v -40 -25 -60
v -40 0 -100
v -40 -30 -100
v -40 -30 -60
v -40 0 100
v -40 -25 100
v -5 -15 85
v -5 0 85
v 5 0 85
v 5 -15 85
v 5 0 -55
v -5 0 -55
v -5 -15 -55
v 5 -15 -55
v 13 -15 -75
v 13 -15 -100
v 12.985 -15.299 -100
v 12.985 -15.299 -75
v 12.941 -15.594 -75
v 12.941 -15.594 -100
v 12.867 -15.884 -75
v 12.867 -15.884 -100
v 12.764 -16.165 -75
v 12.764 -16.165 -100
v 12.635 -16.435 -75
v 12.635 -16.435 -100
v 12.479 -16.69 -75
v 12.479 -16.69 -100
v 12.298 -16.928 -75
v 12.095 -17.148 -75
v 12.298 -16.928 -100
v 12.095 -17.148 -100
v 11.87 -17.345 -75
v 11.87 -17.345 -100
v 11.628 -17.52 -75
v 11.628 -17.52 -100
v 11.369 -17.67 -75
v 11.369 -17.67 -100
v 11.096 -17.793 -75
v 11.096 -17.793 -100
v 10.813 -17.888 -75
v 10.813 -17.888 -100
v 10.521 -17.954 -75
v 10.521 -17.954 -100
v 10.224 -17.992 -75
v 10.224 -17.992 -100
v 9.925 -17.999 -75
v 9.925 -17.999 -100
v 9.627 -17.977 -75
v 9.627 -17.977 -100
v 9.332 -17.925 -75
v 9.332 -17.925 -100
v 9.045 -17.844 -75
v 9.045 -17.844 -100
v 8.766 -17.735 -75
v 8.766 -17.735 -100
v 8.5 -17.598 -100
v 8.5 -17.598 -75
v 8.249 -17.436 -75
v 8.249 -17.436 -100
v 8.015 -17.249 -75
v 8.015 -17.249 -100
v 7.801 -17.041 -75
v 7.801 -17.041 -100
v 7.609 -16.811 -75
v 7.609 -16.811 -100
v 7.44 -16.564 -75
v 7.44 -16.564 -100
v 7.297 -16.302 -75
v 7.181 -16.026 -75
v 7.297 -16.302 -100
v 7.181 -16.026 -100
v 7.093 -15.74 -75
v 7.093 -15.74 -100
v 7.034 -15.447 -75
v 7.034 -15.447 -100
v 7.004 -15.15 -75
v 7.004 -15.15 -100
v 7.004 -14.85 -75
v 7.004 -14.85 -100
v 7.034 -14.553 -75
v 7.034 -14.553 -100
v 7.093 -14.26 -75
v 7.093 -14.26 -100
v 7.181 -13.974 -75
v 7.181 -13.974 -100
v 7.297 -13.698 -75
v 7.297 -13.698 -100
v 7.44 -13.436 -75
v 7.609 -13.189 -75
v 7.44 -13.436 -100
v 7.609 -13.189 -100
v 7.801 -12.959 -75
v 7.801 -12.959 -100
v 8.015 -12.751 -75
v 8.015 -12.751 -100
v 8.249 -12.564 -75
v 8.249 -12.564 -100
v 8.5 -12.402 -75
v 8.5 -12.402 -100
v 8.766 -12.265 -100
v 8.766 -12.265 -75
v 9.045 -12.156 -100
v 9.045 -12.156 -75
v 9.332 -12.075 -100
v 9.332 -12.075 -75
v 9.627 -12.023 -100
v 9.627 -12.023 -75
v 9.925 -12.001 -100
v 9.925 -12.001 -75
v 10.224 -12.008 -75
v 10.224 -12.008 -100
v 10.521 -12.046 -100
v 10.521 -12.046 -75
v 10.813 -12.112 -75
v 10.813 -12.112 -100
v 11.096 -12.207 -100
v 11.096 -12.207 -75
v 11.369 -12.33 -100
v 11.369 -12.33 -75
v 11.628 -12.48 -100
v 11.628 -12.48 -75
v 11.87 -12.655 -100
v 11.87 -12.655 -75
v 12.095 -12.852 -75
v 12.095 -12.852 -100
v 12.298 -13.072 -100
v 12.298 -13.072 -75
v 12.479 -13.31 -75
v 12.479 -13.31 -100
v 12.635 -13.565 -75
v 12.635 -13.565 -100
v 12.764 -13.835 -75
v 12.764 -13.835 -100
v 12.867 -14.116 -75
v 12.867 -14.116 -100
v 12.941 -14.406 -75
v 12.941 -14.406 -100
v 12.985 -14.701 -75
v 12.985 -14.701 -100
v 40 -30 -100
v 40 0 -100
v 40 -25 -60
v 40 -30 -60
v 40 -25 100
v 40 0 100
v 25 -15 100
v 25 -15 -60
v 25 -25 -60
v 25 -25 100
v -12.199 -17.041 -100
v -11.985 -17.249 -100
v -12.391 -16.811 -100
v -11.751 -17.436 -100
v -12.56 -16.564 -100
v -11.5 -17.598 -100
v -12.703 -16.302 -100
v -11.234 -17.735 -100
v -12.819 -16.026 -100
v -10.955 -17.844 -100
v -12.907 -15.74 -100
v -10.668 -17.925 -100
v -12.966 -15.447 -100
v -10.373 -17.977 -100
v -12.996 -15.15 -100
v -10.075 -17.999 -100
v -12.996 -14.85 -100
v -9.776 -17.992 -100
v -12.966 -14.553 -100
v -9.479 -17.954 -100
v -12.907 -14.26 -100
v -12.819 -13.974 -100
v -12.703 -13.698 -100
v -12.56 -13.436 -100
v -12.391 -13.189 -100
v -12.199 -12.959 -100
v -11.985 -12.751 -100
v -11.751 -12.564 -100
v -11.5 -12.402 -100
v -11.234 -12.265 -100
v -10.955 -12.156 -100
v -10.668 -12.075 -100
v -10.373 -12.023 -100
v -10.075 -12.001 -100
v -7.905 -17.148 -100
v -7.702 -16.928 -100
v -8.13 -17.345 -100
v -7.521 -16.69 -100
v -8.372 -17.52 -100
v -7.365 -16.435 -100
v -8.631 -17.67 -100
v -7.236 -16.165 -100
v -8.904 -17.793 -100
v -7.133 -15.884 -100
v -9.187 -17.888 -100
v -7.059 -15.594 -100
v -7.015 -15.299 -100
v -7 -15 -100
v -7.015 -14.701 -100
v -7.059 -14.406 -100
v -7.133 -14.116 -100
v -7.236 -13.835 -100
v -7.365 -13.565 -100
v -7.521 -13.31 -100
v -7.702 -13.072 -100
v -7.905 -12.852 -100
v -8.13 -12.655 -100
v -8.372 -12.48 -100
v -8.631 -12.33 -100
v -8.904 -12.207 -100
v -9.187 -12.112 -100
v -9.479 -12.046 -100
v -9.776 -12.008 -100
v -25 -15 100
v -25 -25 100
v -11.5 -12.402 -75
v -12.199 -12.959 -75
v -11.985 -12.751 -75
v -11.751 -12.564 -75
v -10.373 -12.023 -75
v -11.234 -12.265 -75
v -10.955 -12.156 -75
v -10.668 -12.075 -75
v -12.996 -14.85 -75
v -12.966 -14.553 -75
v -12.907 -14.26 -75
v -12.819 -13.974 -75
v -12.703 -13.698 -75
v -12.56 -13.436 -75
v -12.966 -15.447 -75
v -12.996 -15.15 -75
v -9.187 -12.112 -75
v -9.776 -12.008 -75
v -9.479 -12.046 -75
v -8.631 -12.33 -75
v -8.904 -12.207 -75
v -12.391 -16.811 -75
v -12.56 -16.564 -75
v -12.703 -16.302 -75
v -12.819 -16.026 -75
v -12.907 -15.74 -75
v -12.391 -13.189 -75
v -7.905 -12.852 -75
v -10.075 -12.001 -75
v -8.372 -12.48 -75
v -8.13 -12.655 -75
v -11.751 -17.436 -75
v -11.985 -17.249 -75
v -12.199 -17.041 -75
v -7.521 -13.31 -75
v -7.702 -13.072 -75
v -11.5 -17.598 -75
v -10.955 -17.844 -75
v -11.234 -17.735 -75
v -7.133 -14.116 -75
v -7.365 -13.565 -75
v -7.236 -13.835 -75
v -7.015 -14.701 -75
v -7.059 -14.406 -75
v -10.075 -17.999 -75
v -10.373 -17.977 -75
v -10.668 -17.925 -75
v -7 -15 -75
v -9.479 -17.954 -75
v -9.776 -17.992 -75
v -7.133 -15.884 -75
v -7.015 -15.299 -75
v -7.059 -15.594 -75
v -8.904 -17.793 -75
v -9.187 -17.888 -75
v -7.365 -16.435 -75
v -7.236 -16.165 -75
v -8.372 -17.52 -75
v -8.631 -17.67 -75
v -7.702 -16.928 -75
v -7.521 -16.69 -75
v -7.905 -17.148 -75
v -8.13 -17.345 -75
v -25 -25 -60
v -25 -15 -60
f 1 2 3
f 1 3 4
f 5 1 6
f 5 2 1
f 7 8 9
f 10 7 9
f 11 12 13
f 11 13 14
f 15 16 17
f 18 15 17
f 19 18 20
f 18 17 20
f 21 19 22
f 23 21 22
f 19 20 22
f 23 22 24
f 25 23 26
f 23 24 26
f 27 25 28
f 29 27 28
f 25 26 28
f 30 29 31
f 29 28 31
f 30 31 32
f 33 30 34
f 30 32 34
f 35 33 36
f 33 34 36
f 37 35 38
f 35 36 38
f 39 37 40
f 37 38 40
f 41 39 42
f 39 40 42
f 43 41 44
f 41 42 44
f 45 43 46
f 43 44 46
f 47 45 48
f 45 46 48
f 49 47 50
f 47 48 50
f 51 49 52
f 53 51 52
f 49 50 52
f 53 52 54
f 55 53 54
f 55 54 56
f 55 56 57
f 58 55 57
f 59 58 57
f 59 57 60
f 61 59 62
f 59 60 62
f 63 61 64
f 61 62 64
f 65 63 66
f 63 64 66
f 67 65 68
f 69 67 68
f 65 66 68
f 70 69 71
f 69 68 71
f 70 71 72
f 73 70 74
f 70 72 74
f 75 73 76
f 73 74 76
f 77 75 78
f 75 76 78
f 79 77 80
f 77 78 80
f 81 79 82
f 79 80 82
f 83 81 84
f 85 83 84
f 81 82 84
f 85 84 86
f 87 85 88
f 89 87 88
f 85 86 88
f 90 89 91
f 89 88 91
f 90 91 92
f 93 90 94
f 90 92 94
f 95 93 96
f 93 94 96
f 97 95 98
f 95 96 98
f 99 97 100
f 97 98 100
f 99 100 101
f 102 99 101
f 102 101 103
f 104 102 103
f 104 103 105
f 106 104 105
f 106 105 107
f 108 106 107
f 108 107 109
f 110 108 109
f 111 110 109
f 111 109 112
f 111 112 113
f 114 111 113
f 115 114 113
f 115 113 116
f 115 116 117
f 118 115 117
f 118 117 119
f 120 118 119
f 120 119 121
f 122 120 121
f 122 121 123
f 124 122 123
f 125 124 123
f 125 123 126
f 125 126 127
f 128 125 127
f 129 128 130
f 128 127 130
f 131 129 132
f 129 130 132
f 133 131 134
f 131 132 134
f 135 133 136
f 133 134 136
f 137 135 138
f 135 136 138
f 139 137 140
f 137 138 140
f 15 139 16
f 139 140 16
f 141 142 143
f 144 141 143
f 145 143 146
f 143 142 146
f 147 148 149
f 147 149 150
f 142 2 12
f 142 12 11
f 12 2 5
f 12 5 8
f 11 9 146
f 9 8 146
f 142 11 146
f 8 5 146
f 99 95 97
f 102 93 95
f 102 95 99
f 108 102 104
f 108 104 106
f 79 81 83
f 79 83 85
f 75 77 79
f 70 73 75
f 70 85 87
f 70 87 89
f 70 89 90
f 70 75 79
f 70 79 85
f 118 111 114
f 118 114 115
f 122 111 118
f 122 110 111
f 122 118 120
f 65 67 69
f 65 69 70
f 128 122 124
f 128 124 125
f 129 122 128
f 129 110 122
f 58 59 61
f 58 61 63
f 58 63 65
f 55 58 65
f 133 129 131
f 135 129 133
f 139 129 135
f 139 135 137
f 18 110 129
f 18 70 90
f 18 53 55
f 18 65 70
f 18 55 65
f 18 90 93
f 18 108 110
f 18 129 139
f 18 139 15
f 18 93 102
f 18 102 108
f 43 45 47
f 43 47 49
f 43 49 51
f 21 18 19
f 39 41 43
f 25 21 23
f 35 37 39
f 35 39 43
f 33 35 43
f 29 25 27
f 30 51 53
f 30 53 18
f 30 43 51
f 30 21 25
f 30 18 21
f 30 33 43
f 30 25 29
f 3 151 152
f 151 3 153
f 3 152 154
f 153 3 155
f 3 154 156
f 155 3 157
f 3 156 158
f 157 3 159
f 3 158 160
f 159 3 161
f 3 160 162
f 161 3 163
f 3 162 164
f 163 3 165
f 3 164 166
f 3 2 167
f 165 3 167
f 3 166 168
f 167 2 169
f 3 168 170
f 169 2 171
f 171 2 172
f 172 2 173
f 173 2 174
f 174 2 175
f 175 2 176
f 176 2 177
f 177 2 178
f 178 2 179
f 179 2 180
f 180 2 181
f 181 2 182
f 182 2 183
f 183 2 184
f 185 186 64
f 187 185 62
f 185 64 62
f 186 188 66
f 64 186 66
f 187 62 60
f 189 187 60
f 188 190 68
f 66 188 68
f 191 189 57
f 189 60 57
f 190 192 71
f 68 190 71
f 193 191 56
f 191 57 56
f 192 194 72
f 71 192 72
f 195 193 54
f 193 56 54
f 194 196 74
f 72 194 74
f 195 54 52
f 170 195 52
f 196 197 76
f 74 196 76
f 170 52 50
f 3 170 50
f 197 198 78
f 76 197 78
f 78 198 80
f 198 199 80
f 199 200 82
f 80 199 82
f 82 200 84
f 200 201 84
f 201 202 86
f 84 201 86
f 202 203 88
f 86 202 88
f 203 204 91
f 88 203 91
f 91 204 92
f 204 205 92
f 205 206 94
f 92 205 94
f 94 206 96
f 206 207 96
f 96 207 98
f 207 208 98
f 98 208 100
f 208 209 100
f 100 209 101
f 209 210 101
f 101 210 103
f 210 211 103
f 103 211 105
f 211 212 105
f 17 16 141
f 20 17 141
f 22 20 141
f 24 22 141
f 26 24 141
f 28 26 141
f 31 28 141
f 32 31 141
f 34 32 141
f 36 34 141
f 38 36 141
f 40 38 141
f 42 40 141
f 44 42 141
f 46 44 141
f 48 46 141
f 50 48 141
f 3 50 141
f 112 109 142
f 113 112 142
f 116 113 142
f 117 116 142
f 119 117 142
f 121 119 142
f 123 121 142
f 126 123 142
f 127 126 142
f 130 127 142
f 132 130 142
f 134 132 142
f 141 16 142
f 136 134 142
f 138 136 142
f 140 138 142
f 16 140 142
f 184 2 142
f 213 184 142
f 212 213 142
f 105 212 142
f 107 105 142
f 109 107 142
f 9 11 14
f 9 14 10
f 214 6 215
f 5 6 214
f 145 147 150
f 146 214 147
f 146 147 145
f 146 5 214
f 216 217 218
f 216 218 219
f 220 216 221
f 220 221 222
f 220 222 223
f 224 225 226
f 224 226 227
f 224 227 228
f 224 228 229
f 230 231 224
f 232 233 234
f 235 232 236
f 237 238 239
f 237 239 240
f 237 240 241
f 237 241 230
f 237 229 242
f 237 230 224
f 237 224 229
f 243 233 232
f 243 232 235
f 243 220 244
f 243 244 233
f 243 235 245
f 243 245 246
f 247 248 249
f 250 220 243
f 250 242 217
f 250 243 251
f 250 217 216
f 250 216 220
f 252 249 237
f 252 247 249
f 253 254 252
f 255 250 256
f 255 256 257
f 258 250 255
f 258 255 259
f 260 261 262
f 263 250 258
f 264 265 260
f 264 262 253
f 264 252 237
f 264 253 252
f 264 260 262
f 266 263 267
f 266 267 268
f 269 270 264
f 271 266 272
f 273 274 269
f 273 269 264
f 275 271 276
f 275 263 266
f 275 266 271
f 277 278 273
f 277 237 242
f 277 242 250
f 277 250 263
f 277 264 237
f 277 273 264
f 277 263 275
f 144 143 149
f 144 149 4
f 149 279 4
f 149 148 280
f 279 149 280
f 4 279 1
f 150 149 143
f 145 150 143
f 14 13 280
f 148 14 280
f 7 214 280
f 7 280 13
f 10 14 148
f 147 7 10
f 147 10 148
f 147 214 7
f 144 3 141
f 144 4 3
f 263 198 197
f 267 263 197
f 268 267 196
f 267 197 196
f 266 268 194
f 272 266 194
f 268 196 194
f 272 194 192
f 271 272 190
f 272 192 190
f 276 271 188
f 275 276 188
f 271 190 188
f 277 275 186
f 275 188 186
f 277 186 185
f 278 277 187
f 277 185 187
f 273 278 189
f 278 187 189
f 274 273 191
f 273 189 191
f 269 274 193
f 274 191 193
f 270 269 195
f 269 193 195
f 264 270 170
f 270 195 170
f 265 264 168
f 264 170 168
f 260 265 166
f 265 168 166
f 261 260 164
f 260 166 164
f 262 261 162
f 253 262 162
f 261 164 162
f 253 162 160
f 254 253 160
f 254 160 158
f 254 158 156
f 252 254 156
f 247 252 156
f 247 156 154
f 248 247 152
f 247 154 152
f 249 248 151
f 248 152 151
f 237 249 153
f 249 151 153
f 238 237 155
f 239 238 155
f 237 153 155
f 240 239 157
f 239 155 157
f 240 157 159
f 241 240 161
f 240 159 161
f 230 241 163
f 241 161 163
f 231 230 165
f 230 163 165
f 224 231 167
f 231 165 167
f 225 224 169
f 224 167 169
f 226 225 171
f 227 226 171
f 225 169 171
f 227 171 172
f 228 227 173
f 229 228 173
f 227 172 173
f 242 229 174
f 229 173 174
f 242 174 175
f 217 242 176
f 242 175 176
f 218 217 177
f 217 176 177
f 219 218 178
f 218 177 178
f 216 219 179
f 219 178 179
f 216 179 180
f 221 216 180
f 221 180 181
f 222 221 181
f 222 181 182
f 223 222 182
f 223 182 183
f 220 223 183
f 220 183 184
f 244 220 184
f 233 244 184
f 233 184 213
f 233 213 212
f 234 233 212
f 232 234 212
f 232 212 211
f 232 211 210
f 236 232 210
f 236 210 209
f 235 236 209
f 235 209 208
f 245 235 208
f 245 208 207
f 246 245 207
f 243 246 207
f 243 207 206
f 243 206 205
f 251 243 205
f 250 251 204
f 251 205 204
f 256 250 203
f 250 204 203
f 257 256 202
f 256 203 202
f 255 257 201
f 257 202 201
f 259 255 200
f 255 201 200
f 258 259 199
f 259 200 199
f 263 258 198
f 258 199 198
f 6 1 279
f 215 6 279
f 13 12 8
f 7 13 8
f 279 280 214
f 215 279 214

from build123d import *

# Parameters (mm, degrees)
F0_W     = 50
F0_H     = 160
F0_W_2   = 10
F0_H_2   = 140
F1_DEPTH = 15
F2_DEPTH = 30
F3_R     = 3
F4_DEPTH = 25
F0_W_3   = 15
F5_DEPTH = 25


with BuildPart() as f1:
    # F0 (on Front) → F1 (new body)
    with BuildSketch(Plane.XZ):
        with Locations((0, 20)):
            Rectangle(F0_W, F0_H)
        with Locations((0, 15)):
            Rectangle(F0_W_2, F0_H_2, mode=Mode.SUBTRACT)
    extrude(amount=F1_DEPTH)

    # F0 (on Front) → F2 (join)
    with BuildSketch(Plane.XZ):
        Polygon((-40, -100), (40, -100), (40, -60), (25, -60), (-25, -60), (-40, -60), align=None)
    extrude(amount=F2_DEPTH)

    # F3 (on face) → F4 (cut)
    with BuildSketch(Plane(origin=(0, 0, -100), x_dir=(1, 0, 0), z_dir=(0, 0, -1))):
        with Locations((-10, 15)):
            Circle(F3_R)
        with Locations((10, 15)):
            Circle(F3_R)
    extrude(amount=-F4_DEPTH, mode=Mode.SUBTRACT)

    # F0 (on Front) → F5 (join)
    with BuildSketch(Plane.XZ):
        with Locations((-32.5, 20)):
            Rectangle(F0_W_3, F0_H)
        with Locations((32.5, 20)):
            Rectangle(F0_W_3, F0_H)
    extrude(amount=F5_DEPTH)


solid = f1.part
